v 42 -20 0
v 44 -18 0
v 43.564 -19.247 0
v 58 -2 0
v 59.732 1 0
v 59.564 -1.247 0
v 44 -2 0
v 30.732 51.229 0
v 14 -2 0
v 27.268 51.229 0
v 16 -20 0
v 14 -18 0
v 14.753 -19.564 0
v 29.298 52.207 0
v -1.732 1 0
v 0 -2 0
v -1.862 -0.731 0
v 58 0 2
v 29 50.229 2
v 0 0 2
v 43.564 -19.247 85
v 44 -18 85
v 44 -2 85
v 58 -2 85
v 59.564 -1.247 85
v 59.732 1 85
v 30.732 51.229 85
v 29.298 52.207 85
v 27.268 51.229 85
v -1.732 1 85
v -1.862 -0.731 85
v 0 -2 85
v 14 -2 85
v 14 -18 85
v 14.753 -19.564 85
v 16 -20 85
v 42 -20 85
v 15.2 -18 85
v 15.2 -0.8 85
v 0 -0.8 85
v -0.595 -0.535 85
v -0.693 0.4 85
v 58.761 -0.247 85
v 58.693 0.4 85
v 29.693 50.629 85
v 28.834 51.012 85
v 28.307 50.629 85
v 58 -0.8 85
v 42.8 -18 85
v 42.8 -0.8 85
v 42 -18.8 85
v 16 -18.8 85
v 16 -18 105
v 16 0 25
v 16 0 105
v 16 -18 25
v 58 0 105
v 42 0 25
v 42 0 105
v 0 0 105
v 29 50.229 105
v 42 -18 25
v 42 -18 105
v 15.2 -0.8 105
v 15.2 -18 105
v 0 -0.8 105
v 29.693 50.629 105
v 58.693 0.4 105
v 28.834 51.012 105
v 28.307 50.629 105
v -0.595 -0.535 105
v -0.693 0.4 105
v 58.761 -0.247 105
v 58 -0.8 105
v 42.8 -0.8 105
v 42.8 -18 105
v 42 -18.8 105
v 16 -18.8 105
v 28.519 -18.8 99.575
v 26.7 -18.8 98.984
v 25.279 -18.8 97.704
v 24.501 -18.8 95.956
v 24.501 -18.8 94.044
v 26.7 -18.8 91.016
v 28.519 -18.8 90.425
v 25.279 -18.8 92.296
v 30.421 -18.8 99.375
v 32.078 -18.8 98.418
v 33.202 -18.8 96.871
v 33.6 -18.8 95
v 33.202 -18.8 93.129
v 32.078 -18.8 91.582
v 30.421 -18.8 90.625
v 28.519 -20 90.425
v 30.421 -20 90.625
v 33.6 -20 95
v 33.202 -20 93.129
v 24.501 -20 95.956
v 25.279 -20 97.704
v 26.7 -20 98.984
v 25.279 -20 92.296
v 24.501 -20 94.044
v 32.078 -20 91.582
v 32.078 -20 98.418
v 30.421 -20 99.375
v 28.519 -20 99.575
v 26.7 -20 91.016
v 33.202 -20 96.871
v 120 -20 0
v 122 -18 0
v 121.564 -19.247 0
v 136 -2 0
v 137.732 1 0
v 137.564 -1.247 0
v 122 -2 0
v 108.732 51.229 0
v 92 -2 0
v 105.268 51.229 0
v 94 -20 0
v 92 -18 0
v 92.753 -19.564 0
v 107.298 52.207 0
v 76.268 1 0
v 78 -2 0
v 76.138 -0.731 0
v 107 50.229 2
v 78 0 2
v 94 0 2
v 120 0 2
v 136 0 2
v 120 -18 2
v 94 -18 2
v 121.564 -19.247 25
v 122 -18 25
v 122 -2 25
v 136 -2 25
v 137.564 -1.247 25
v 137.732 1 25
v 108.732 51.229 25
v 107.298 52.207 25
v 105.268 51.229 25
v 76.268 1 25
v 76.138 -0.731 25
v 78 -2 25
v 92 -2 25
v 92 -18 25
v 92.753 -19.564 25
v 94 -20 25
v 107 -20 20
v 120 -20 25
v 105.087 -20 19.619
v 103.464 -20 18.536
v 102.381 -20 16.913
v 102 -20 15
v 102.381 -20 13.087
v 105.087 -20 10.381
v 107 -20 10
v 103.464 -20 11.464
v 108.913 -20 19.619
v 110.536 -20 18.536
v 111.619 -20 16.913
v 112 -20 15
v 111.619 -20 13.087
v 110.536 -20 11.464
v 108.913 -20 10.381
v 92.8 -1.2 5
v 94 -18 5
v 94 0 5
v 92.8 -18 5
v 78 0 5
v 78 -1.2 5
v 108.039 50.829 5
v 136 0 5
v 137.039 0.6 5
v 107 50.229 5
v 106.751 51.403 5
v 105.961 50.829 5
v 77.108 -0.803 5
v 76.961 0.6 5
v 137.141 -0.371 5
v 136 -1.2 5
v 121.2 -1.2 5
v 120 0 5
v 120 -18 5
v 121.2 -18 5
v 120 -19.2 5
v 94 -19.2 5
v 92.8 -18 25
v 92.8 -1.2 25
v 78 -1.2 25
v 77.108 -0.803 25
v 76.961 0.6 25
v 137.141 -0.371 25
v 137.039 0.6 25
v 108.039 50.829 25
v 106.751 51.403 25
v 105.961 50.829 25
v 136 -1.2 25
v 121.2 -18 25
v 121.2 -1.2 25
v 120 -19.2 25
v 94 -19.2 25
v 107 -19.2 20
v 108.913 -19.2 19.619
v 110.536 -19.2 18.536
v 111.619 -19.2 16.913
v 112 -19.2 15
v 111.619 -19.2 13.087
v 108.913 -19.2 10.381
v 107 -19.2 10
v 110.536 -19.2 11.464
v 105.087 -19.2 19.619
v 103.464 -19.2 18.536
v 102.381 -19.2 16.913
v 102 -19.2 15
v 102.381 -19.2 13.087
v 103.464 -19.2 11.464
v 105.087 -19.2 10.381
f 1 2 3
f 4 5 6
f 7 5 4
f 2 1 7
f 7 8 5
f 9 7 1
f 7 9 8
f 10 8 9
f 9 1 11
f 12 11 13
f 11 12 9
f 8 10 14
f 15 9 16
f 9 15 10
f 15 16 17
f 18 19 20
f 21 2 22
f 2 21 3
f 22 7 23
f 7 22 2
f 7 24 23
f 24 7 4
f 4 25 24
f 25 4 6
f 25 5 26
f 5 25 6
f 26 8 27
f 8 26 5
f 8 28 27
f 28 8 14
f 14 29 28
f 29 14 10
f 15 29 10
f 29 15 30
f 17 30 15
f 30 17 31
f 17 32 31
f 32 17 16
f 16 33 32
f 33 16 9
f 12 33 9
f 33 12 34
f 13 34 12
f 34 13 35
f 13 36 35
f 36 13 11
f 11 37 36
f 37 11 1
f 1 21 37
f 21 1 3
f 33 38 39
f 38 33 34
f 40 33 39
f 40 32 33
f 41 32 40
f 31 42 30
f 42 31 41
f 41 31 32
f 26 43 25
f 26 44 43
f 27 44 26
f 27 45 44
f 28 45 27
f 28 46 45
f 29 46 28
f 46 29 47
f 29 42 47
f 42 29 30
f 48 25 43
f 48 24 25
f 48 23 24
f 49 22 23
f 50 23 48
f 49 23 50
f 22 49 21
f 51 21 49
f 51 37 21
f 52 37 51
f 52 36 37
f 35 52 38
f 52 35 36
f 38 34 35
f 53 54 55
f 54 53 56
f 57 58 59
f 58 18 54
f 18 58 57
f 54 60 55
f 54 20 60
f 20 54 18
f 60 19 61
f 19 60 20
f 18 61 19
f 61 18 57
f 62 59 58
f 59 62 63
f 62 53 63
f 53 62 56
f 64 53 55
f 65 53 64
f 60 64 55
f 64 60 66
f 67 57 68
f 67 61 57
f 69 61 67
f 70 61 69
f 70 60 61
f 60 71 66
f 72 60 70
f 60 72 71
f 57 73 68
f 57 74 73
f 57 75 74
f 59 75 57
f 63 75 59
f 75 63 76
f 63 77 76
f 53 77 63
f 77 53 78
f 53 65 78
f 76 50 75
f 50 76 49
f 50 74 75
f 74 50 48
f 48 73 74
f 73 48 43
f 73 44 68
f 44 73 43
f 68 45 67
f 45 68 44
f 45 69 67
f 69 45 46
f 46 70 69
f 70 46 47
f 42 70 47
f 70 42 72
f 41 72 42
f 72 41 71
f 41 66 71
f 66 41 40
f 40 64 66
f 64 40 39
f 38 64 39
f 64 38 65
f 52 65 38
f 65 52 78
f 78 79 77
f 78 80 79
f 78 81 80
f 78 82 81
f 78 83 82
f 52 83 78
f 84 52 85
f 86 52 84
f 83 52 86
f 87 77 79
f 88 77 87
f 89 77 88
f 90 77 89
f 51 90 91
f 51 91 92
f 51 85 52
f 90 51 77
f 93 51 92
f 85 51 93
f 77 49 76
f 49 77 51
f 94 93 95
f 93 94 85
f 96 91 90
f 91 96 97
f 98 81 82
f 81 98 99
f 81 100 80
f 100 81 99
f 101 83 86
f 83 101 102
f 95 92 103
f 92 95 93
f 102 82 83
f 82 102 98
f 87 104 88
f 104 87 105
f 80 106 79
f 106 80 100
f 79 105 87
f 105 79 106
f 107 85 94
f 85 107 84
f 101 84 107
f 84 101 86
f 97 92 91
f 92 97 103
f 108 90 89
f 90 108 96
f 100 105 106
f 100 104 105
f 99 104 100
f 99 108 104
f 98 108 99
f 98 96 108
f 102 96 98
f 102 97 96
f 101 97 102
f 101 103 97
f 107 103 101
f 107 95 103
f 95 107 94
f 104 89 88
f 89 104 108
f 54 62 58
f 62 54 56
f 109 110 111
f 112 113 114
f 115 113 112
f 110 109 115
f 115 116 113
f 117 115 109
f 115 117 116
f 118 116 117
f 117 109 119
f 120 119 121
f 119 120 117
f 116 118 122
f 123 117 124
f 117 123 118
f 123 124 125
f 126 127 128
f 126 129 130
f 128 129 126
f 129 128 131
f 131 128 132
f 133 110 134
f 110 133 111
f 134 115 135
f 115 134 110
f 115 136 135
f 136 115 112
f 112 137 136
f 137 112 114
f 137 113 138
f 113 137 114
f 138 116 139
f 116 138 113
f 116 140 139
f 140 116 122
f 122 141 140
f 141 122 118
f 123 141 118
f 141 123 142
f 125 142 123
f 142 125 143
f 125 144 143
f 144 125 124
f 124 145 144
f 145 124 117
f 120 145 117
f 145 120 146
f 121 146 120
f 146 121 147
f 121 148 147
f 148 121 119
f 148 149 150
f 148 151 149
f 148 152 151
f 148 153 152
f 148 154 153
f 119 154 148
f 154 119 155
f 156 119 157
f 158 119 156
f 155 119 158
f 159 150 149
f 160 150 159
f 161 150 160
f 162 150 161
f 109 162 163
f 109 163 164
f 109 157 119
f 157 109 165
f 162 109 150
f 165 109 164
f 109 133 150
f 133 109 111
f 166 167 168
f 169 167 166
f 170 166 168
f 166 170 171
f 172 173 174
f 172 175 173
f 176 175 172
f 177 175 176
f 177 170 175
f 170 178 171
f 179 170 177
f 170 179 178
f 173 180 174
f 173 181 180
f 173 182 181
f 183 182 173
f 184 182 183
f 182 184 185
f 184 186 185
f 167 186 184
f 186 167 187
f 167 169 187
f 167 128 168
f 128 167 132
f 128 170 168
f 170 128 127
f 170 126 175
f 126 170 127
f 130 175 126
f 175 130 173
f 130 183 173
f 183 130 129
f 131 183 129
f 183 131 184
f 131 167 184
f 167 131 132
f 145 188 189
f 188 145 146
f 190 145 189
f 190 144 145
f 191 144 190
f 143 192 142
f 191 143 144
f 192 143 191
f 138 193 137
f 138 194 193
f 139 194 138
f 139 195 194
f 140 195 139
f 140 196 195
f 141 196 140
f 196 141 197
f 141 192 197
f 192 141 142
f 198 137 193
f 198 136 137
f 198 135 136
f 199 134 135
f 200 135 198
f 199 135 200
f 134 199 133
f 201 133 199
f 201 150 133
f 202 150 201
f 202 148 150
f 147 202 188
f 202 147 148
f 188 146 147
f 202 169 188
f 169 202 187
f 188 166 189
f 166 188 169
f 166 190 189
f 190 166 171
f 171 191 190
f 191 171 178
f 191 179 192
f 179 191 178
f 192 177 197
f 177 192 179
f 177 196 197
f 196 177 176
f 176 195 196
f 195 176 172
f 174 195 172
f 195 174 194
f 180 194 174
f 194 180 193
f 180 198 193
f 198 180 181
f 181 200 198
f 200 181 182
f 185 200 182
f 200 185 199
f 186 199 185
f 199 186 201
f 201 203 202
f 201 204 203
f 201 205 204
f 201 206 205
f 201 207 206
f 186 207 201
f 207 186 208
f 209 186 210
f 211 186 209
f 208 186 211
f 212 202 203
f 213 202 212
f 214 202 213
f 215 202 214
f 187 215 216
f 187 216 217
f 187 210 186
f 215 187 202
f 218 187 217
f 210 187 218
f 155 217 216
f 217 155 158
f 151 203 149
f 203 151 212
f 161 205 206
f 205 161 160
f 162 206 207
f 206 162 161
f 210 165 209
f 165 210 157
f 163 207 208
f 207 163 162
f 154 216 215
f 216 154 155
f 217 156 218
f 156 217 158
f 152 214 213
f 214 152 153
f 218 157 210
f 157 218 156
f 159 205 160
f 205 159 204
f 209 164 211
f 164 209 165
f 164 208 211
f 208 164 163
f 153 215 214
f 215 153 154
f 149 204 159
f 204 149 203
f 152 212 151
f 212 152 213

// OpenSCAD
// file: SnapContainer.scad
tolerance = 0.4;

module container_shape(width, box_width, box_depth) {
    polygon([[0,0], [width,0], [width/2,sin(60) * width]]);
    center_align_offset =  (width-box_width)/2;
    polygon([
        [center_align_offset,0],
        [width-center_align_offset,0],
        [width-center_align_offset,-box_depth],
        [center_align_offset,-box_depth]
    ]);
}

module triangle_container(width, height, box_width, box_depth, wall_thickness=2) {
	linear_extrude(wall_thickness) {
        offset(wall_thickness) {
            container_shape(width, box_width, box_depth);
        }
	}

    translate([0,0,wall_thickness]) {
        linear_extrude(height-wall_thickness) {
            difference() {
                offset(wall_thickness) {
                    container_shape(width, box_width, box_depth);
                }
                container_shape(width, box_width, box_depth);
            }
        }
    }
}

module triangle_container_case(width, height, box_width=0, box_depth=0, box_height=0, wall_thickness=2, overlap = 20) {
	
	triangle_container(width, height-overlap, box_width, box_depth, wall_thickness);
    linear_extrude(height-box_height) {
        center_align_offset =  (width-box_width)/2;
        polygon([
            [center_align_offset,0],
            [width-center_align_offset,0],
            [width-center_align_offset,-box_depth],
            [center_align_offset,-box_depth]
        ]);
    }

	translate([0,0,height-overlap]) {
		linear_extrude(overlap) {
			difference() {
				offset(wall_thickness/2 - tolerance/2) {
					container_shape(width, box_width, box_depth);
				}
				container_shape(width, box_width, box_depth);
				
			}
		}
        translate([width/2,-box_depth,overlap/2]) {
            rotate([90,0,0]) linear_extrude(wall_thickness) circle(5 - tolerance);
        }
	}
}

module triangle_container_lid(width, height, box_width=0, box_depth=0, wall_thickness=2, overlap = 20) {

	triangle_container(width, height, box_width, box_depth, wall_thickness);
	translate([0,0,height]) {
        difference() {
            linear_extrude(overlap) {
                difference() {
                    offset(wall_thickness) {
                        container_shape(width, box_width, box_depth);
                    }
                    offset(wall_thickness/2 + tolerance/2)
                    container_shape(width, box_width, box_depth);
                }
            }
            translate([width/2,-box_depth,overlap/2]) {
                rotate([90,0,0]) linear_extrude(wall_thickness+3) circle(5);
            }
        }
	}
}




width = 26;
height = 25;
box_width = 0;
box_depth = 0;
box_height = 0;
lid_height = 5;

// Case
triangle_container_case(width, height, box_width, box_depth, 
box_height - lid_height, 2, 20);

//Lid
translate([width + 20, 0, 0])
triangle_container_lid(width, lid_height, box_width, box_depth,
 2, 20);
// main file
use <SnapContainer.scad>;

module incut(incut_width, incut_height, incut_offset) {
    translate([-10,5, incut_height/2 + 7 + 2]) {
        rotate([0,90,0]) {
            linear_extrude(width + 15) {
                polygon([[0,0],[incut_width,0],[0,incut_height/2]]);
                polygon([[incut_width + incut_offset,incut_offset],[incut_width + incut_offset,incut_height/2 + incut_offset],[incut_offset,incut_height/2 + incut_offset]]); 
                mirror([1,0,0]) {
                    polygon([[0,0],[incut_width,0],[0,incut_height/2]]);
                    polygon([[incut_width + incut_offset,incut_offset],[incut_width + incut_offset,incut_height/2 + incut_offset],[incut_offset,incut_height/2 + incut_offset]]); 
                }
            }
        }
    }
}

width = 58;
height = 110;
box_width = 26;
box_depth = 18;
box_height = 85;
lid_height = 5;

// Case
difference() {
    
    triangle_container_case(width, height - lid_height, box_width, box_depth, box_height - lid_height, 2, 20);
    //incut(30, 70, 5);

}

//Lid
translate([width + 20, 0, 0])
triangle_container_lid(width, lid_height, box_width, box_depth, 2, 20);
